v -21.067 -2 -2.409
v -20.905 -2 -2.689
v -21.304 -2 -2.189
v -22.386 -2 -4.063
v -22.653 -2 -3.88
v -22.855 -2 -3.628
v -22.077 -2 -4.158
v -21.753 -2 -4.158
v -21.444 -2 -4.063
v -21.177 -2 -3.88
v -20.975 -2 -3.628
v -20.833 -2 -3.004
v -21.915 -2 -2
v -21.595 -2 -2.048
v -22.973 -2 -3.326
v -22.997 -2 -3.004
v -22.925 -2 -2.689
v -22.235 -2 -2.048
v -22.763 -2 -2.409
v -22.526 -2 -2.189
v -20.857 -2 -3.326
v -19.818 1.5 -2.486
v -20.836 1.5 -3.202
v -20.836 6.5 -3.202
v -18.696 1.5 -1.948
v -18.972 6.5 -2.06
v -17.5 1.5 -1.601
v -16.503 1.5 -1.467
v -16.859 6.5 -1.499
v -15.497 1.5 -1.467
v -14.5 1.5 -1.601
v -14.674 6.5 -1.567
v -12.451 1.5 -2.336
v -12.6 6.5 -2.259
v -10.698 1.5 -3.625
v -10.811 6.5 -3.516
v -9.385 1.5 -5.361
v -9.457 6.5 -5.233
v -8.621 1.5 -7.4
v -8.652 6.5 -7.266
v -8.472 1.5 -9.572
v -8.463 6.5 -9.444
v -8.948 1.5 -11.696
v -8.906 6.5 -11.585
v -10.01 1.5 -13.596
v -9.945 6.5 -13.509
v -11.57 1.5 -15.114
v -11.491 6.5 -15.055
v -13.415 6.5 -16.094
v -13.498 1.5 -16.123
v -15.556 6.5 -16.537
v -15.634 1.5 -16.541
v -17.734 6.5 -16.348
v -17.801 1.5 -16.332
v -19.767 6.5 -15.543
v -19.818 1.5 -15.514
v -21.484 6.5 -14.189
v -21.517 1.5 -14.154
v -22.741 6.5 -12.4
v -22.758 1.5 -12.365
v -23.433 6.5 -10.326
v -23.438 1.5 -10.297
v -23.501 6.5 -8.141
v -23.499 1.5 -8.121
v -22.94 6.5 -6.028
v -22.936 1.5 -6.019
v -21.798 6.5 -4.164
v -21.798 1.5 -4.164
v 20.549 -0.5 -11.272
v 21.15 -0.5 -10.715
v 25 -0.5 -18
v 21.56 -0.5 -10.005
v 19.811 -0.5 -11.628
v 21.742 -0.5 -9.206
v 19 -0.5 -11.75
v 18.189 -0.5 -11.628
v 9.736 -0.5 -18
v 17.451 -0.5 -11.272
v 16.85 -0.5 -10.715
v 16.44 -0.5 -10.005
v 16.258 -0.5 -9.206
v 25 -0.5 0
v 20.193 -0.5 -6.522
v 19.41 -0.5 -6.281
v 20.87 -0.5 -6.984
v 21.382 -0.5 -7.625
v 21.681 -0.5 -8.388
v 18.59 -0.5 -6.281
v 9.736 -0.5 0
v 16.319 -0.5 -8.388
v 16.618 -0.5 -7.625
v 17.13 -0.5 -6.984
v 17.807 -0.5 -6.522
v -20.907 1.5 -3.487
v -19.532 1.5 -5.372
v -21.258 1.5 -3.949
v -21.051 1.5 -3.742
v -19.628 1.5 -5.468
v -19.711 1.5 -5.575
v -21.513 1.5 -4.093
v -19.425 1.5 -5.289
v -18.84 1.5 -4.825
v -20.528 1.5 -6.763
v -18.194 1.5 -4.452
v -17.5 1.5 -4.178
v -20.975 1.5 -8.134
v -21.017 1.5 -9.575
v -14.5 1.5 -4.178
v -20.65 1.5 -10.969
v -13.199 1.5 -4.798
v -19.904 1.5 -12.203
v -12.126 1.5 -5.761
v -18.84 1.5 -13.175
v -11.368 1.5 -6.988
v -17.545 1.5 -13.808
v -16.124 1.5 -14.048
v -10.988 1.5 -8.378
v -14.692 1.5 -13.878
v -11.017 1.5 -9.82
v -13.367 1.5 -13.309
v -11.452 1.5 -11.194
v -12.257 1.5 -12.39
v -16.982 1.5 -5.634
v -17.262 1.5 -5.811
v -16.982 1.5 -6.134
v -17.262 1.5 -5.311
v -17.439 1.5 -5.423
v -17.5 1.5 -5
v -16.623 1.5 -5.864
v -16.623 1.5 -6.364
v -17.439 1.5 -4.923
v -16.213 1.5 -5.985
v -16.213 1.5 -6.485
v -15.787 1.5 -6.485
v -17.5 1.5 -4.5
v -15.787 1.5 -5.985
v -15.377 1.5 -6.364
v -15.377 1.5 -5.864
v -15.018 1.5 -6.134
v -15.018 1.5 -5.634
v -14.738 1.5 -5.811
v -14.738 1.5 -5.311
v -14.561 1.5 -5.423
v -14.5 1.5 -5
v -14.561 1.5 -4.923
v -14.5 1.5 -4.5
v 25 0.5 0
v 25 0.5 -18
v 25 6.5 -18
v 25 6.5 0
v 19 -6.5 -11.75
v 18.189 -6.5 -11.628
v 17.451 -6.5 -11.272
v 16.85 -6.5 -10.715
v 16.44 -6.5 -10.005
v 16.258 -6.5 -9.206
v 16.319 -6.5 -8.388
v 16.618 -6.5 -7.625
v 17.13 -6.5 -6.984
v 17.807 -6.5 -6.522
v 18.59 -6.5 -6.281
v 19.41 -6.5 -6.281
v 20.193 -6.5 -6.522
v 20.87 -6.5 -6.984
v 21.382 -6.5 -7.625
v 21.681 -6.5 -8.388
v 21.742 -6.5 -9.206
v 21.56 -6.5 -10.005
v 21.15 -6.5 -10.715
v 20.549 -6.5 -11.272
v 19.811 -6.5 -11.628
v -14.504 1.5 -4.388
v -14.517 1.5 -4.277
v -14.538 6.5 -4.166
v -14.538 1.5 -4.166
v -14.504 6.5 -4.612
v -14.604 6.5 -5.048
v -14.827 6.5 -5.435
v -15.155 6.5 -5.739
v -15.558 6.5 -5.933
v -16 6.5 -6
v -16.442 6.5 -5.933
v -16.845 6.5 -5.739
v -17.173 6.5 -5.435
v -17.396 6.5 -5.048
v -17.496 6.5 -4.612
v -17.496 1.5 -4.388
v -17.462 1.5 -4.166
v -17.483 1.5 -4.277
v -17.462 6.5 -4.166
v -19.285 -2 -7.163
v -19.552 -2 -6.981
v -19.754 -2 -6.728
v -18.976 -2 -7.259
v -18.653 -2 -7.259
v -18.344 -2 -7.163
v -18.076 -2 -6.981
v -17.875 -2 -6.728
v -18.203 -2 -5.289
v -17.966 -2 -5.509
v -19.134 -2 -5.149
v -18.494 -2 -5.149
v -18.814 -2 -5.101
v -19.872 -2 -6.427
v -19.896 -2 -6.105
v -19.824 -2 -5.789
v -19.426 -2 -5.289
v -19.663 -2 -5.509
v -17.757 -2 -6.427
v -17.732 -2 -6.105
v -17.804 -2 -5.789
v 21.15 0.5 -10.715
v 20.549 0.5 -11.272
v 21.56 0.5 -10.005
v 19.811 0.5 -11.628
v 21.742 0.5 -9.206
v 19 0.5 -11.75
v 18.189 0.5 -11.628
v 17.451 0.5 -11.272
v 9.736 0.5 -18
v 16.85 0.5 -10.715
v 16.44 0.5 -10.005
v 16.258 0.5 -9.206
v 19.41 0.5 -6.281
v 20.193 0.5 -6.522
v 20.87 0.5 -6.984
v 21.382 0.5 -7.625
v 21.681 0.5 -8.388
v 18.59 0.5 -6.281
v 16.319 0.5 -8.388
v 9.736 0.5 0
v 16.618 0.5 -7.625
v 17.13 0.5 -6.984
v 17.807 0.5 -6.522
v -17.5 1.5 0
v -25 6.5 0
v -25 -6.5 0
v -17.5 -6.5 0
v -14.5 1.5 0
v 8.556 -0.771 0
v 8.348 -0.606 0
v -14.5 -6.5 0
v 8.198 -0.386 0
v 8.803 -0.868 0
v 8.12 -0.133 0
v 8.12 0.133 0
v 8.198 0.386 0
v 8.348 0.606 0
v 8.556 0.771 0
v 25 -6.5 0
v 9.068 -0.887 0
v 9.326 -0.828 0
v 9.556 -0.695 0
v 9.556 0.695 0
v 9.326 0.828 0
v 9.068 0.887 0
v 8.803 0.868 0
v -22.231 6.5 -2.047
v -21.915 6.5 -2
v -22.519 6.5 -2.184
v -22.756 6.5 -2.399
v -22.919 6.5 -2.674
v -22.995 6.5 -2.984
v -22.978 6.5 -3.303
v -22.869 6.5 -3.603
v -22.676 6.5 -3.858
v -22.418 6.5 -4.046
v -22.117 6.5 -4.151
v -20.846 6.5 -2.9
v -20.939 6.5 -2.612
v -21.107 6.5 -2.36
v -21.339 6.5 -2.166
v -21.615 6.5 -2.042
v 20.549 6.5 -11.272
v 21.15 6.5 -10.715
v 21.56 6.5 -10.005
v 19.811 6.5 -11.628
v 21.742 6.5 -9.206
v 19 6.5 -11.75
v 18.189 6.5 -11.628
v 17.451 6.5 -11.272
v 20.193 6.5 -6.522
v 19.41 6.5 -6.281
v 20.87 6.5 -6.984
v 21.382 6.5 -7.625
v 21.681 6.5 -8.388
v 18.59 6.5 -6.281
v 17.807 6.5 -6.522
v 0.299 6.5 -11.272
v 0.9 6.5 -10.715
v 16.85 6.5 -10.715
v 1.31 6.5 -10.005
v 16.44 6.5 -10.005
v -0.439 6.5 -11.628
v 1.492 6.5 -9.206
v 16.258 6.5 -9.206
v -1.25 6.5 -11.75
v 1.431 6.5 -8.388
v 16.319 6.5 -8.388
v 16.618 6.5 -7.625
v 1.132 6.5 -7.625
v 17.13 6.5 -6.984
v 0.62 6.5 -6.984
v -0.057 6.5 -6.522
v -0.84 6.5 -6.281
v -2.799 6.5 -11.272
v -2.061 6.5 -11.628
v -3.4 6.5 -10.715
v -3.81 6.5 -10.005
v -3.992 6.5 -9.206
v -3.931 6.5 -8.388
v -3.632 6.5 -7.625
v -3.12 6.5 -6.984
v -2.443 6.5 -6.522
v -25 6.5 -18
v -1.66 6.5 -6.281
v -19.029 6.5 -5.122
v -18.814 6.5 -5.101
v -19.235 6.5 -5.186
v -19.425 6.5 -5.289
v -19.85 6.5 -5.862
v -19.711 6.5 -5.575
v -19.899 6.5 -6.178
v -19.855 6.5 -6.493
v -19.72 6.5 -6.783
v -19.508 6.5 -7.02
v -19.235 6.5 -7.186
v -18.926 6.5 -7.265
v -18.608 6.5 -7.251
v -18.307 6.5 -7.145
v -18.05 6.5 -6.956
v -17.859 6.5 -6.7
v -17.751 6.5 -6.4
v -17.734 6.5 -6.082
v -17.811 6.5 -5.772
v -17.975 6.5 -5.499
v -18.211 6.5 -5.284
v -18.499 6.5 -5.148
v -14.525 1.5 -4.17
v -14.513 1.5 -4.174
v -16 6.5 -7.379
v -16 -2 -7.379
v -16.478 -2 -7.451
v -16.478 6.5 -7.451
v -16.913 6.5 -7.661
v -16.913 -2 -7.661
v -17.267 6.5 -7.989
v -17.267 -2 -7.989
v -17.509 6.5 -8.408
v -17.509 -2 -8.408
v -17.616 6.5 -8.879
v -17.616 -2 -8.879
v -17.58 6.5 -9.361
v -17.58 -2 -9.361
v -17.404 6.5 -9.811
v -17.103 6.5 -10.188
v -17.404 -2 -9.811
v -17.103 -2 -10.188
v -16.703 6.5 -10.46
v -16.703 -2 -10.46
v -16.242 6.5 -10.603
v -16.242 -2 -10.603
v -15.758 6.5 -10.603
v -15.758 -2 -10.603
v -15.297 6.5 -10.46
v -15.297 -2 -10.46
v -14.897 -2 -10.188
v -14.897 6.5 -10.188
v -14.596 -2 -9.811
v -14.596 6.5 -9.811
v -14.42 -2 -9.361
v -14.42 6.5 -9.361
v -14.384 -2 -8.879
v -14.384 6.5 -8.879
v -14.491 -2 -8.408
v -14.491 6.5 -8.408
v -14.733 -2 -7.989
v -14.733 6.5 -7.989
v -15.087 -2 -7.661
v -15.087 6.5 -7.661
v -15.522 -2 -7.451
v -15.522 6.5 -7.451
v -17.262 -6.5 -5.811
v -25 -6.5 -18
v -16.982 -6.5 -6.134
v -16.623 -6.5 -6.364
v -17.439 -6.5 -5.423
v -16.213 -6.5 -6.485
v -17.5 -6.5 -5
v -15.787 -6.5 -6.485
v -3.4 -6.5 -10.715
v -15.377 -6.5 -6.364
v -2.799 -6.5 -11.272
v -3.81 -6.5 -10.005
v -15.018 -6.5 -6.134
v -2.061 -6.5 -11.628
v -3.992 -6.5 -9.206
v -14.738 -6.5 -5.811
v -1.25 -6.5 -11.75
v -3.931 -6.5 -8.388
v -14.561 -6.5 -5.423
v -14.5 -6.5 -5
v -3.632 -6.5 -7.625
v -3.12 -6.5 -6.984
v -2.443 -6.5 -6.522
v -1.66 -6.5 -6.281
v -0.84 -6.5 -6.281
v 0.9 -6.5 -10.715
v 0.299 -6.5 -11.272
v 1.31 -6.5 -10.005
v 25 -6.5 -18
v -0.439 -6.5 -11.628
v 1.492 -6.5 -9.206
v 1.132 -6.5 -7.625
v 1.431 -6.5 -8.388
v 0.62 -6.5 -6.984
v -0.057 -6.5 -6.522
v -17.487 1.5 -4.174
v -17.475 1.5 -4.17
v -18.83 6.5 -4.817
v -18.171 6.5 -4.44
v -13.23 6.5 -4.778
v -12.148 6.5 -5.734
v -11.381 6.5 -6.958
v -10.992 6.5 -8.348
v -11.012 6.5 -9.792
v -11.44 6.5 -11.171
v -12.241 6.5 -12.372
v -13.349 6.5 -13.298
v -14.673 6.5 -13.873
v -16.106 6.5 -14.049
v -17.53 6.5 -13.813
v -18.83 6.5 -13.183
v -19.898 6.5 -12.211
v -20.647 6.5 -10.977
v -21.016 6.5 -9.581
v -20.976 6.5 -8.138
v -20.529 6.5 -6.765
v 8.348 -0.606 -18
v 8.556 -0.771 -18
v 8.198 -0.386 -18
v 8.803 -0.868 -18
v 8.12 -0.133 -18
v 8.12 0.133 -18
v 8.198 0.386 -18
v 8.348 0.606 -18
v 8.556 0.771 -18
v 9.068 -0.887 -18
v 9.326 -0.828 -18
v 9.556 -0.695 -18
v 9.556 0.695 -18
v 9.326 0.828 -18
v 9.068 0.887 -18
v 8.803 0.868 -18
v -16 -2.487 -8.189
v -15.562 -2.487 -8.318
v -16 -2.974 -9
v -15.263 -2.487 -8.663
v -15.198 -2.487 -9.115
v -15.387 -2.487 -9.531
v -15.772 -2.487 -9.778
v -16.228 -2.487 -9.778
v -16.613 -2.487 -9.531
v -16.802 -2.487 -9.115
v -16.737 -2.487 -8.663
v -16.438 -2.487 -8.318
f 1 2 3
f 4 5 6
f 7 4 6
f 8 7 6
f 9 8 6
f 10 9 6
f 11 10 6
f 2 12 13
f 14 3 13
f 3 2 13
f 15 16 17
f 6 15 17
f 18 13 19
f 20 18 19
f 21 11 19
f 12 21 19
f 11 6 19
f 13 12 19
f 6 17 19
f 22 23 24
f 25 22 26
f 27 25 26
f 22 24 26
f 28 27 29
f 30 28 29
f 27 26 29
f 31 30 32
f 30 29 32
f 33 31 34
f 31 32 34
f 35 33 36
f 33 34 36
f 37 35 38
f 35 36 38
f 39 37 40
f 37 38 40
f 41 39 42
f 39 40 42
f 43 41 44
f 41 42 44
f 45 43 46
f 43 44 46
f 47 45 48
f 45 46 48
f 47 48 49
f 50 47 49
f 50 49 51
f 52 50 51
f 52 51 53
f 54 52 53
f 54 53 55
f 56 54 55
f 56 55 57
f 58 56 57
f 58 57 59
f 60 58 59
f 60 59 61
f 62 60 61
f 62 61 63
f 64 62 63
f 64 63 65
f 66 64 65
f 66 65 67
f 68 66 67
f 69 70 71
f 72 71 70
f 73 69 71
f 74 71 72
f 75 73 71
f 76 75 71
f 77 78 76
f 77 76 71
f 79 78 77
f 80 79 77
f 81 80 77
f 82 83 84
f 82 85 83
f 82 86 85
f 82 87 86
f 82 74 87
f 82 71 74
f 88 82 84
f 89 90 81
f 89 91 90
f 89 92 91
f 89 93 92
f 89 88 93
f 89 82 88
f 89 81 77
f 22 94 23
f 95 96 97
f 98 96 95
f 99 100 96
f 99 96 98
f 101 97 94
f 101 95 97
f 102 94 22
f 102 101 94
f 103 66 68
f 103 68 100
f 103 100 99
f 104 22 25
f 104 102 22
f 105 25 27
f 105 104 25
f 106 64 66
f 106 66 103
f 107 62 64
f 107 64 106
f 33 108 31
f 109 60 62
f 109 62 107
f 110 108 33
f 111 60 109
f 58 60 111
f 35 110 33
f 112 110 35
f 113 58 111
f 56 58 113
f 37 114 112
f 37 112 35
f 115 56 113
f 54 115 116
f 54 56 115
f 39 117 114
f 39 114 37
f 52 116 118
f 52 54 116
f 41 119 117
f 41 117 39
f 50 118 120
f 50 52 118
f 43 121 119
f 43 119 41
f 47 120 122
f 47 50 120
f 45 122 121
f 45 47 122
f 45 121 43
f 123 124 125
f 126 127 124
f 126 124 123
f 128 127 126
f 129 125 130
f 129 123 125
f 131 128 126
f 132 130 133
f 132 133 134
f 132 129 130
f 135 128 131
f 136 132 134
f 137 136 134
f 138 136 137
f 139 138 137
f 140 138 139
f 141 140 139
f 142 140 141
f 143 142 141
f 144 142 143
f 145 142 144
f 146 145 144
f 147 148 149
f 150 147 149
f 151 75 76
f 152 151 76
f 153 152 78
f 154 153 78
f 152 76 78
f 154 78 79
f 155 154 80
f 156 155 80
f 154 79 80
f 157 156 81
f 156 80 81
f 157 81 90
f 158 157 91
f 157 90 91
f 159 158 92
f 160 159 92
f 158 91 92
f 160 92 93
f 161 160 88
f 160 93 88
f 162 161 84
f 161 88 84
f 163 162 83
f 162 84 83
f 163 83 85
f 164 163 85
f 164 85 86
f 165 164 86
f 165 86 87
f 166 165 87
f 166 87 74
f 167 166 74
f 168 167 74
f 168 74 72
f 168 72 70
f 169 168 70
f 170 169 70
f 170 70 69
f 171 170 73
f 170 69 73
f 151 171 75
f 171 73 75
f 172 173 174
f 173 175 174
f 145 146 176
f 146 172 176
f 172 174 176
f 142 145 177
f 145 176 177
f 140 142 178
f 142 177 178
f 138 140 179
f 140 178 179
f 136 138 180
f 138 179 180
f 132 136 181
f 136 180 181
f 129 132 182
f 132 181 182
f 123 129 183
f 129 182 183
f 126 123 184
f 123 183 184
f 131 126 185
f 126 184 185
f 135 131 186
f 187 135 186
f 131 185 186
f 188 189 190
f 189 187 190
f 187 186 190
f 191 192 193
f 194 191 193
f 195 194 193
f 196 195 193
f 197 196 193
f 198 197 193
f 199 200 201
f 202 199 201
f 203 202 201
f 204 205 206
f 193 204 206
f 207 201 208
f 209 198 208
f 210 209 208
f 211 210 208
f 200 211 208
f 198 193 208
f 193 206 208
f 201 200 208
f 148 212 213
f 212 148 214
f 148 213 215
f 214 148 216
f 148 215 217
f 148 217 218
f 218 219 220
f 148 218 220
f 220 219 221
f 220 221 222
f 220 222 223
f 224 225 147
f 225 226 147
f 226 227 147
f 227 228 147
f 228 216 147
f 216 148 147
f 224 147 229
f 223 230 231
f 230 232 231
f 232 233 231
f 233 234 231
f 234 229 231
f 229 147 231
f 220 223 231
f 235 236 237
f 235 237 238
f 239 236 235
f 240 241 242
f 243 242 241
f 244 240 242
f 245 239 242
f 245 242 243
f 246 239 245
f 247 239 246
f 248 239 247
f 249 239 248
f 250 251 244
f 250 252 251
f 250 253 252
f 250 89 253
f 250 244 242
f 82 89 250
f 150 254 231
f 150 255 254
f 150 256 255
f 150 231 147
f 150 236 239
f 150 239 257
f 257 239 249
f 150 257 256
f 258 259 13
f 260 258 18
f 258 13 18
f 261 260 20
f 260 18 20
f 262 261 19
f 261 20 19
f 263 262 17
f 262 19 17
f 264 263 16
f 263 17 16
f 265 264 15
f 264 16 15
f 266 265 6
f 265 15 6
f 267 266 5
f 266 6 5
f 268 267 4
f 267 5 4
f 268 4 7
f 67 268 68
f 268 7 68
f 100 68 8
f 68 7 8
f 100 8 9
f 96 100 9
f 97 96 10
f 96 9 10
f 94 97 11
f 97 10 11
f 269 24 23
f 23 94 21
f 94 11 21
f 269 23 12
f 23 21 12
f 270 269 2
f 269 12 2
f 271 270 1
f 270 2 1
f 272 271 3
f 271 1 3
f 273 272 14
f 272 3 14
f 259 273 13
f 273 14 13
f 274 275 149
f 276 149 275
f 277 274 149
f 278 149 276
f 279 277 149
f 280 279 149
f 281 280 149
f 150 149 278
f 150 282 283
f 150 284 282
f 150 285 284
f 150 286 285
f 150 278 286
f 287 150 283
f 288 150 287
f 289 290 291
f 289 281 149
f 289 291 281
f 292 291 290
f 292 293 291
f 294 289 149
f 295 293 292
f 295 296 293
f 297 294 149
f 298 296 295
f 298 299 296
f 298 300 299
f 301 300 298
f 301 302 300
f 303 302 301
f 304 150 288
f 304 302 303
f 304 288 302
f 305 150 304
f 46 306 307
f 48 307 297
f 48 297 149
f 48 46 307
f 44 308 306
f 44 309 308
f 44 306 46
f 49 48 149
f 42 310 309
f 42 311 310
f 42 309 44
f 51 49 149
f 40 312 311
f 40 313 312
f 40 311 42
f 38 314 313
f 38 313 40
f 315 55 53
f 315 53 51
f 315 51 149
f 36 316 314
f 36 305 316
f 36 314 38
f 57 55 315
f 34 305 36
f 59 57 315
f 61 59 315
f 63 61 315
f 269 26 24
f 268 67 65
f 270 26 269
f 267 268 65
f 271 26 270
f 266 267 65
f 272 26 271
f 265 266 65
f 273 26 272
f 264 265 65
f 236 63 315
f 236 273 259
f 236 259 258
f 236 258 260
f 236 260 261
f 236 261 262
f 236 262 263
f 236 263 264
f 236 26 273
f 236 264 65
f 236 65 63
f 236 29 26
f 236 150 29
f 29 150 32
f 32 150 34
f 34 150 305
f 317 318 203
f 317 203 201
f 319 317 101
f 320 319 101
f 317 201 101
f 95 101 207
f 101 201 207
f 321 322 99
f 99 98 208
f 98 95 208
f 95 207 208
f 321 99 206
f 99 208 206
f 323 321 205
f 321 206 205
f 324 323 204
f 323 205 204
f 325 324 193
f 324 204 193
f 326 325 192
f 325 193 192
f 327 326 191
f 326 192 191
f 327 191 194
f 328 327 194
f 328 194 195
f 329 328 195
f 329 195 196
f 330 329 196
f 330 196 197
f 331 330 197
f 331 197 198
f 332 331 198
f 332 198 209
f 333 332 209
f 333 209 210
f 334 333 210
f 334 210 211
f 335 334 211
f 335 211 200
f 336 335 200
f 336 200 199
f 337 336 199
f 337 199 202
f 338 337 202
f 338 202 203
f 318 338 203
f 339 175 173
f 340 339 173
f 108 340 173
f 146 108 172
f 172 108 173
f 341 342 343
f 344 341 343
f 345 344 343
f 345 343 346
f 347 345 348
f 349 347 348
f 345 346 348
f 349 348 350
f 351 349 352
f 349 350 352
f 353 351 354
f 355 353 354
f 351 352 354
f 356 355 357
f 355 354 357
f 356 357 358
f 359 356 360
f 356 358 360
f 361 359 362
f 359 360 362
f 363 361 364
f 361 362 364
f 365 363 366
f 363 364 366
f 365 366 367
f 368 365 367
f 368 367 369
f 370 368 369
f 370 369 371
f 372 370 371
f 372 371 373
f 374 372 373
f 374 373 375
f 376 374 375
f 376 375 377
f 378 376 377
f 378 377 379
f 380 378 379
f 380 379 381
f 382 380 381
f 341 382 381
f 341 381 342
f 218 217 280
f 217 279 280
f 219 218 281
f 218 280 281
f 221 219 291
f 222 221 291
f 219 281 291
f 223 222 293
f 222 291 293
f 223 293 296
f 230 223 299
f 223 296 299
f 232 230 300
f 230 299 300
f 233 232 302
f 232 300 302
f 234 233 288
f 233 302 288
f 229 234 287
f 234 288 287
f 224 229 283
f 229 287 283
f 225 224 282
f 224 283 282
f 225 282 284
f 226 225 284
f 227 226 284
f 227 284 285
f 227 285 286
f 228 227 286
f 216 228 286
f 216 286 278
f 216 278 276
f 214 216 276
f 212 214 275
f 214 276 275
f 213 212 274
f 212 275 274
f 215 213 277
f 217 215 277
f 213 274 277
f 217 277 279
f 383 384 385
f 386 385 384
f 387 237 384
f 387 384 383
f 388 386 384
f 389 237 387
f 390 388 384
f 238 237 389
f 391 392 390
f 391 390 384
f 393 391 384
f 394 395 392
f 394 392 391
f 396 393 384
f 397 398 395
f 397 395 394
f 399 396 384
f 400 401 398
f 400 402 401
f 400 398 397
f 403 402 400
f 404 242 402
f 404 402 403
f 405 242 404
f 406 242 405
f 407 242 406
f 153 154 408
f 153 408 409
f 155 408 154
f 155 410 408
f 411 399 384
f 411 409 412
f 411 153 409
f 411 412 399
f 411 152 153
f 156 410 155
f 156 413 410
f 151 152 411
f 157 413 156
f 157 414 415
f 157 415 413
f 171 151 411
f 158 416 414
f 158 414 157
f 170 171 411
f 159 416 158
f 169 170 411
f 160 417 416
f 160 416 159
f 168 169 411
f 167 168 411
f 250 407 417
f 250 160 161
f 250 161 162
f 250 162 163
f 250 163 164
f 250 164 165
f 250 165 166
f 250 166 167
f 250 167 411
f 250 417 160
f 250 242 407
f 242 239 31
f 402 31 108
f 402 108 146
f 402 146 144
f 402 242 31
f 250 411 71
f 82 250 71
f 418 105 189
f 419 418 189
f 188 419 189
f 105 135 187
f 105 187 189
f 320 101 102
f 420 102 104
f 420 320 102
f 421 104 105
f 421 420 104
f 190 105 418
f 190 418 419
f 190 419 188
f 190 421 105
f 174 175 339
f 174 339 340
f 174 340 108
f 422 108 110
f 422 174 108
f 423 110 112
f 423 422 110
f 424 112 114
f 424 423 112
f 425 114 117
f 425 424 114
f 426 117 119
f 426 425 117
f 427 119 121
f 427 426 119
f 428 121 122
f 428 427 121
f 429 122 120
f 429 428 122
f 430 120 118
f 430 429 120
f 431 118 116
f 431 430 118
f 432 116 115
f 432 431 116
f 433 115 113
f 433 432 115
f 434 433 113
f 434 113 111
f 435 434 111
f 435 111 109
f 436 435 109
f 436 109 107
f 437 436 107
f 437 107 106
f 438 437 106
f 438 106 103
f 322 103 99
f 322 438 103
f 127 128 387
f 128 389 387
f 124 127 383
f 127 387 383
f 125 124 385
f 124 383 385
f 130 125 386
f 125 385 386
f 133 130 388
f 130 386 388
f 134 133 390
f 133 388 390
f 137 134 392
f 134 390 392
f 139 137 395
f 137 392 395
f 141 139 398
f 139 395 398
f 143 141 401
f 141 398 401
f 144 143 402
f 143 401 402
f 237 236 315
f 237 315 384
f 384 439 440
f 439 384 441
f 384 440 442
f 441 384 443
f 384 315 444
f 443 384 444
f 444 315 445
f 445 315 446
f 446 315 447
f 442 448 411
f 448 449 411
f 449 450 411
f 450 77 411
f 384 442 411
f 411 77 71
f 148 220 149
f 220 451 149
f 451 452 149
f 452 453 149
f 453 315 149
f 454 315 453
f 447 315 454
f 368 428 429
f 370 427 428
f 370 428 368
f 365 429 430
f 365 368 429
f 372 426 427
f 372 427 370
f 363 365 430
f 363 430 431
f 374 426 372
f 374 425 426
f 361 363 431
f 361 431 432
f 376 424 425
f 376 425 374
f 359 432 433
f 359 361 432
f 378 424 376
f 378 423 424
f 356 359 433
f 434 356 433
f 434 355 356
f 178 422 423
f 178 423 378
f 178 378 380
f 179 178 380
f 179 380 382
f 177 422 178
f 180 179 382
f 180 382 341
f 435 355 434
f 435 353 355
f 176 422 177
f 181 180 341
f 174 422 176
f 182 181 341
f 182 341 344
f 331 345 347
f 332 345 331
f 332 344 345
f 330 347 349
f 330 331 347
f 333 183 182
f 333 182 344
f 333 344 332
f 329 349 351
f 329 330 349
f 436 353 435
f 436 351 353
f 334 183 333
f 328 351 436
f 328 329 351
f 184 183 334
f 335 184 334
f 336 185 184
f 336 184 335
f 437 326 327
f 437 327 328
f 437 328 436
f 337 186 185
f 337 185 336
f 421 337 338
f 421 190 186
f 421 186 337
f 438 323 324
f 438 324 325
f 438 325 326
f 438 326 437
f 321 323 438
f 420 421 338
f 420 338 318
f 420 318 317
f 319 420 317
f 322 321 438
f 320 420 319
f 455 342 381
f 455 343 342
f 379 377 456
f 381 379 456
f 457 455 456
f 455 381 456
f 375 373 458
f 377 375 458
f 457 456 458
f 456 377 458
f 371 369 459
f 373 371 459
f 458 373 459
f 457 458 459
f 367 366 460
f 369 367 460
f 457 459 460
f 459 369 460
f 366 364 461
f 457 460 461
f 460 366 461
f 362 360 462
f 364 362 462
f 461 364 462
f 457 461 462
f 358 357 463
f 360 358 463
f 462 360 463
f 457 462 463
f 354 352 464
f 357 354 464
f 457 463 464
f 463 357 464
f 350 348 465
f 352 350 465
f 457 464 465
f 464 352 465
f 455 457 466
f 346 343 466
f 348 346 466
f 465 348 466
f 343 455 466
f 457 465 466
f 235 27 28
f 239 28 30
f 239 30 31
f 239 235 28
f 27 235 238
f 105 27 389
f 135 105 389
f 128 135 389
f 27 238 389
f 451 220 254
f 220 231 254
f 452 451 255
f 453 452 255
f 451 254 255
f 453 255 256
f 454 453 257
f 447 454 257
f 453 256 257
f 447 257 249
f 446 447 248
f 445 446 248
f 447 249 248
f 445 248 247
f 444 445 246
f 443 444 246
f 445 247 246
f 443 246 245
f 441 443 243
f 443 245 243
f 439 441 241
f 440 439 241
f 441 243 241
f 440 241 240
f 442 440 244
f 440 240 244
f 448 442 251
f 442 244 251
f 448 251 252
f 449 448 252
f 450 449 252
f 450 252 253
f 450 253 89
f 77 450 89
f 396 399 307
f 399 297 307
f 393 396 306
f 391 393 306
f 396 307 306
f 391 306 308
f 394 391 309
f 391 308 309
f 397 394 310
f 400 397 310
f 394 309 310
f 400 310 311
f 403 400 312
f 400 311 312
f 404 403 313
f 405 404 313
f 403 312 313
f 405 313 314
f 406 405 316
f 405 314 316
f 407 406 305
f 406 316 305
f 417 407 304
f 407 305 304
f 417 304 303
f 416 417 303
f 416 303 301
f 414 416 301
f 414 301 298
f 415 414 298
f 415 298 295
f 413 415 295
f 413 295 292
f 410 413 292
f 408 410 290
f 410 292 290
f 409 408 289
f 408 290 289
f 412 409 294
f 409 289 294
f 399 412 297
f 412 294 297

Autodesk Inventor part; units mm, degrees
ref_plane "YZ Plane" through (0, 0, 0) normal (1, 0, 0) x (0, 1, 0)
ref_plane "XZ Plane" through (0, 0, 0) normal (0, 1, 0) x (-1, 0, 0)
ref_plane "XY Plane" through (0, 0, 0) normal (0, 0, 1) x (1, 0, 0)
sketch "Sketch1" plane through (0, 0, 0) normal (0, 0, 1) x (1, 0, 0)
  line L0 (-25, -6.5) -> (25, -6.5)
  line L1 (25, -6.5) -> (25, 6.5)
  line L2 (25, 6.5) -> (-25, 6.5)
  line L3 (-25, 6.5) -> (-25, -6.5)
  line L4 (-25, -6.5) -> (25, 6.5) construction
  line L5 (25, -6.5) -> (-25, 6.5) construction
  line L6 (25, 0) -> (9, 0)
  circle A0 centre (9, 0) radius 0.89
  line L7 (25, 0) -> (25, 0.5)
  line L8 (25, 0.5) -> (9.7363, 0.5)
  line L9 (25, 0) -> (25, -0.5)
  line L10 (25, -0.5) -> (9.7363, -0.5)
  point P0 (0, 0)
  dimension "d0" = 50
  dimension "d1" = 13
  dimension "d2" = 16
  dimension "d3" = 1.78
  dimension "d4" = 0.5
  dimension "d5" = 0.5
extrude "Extrusion1" add sketch "Sketch1" against normal blind 18 contours L3 L2 L1 L8 A0 L10 L0
sketch "Sketch2" plane through (-25, -6.5, 0) normal (0, -1, 0) x (1, 0, 0)
  line L0 (50, 0) -> (50, -18) projected
  line L1 (50, -9) -> (44, -9)
  line L2 (44, -9) -> (23.75, -9)
  circle A0 centre (44, -9) radius 4.375
  circle A1 centre (23.75, -9) radius 4.375
  line L3 (0, 0) -> (7.5, 0)
  line L4 (50, 0) -> (0, 0) projected
  line L5 (7.5, 0) -> (9, 0)
  line L6 (9, 0) -> (9, -5)
  circle A2 centre (9, -5) radius 1.5
  line L7 (7.5, 0) -> (7.5, -5)
  line L8 (9, 0) -> (10.5, 0)
  line L9 (10.5, 0) -> (10.5, -5)
  point P0 (25, 0)
  dimension "d8" = 6
  dimension "d9" = 20.25
  dimension "d10" = 8.75
  dimension "d11" = 8.75
  dimension "d12" = 7.5
  dimension "d13" = 1.5
  dimension "d14" = 5
  dimension "d15" = 3
hole "Hole1" at (19, -6.5, -9) at (-1.25, -6.5, -9) direction (0, 1, 0) diameter 5.5 end through all clearance for "Socket Head Cap Screw ISO 4762" size "M5" standard "ISO"
extrude "Extrusion2" cut sketch "Sketch2" against normal blind 8 contours L9 A2 L6 L4 | L6 A2 L7 L4 | A2
sketch "Sketch3" plane through (-25, 6.5, 0) normal (0, 1, 0) x (1, 0, 0)
  line L0 (0, 0) -> (0, 18) projected
  line L1 (0, 0) -> (18, 18)
  line L2 (0, 18) -> (50, 18) projected
  line L3 (0, 0) -> (25.4558, 0) construction
  circle A0 centre (9, 9) radius 7.55
  circle A1 centre (9, 9) radius 5.05
  circle A2 centre (9, 9) radius 2
  line L4 (9, 7) -> (9, 4.5)
  circle A3 centre (9, 4.5) radius 1.5
  line L5 (5.4291, 5.4291) -> (6.1857, 6.1857)
  circle A4 centre (6.1857, 6.1857) radius 1.085
  line L6 (0, 0) -> (3.085, 3.085)
  circle A5 centre (3.085, 3.085) radius 1.085
  point P0 (25, 0)
  point P1 (4.1636, 3.2024)
  point P2 (3.2024, 4.1636)
  point P3 (7.5376, 4.1664)
  point P4 (5.5752, 5.2888)
  point P5 (5.2888, 5.5752)
  point P6 (10.4624, 4.1664)
  dimension "d27" = 10.1
  dimension "d28" = 4
  dimension "d25" = 45
  dimension "d26" = 15.1
  dimension "d29" = 2.5
  dimension "d30" = 3
  dimension "d31" = 1.07
  dimension "d32" = 2.17
  dimension "d33" = 4.3628
  dimension "d34" = 2.17
extrude "Extrusion3" cut sketch "Sketch3" against normal blind 5 contours A0 L1 A1 A4 A5 | A0 A5 L1 A4 A1 A3 | A3 A1 | A1 A3
hole "Hole2" at (-16, 6.5, -9) direction (0, -1, 0) diameter 3.242 depth 8.5 tip angle 118 thread size "M4x0.7" class "6H" standard "ISO Metric profile"
hole "Hole3" at (-18.8143, 6.5, -6.1857) at (-21.915, 6.5, -3.085) direction (0, -1, 0) diameter 2.17 depth 8.5
properties part number "levelmeter-top"
